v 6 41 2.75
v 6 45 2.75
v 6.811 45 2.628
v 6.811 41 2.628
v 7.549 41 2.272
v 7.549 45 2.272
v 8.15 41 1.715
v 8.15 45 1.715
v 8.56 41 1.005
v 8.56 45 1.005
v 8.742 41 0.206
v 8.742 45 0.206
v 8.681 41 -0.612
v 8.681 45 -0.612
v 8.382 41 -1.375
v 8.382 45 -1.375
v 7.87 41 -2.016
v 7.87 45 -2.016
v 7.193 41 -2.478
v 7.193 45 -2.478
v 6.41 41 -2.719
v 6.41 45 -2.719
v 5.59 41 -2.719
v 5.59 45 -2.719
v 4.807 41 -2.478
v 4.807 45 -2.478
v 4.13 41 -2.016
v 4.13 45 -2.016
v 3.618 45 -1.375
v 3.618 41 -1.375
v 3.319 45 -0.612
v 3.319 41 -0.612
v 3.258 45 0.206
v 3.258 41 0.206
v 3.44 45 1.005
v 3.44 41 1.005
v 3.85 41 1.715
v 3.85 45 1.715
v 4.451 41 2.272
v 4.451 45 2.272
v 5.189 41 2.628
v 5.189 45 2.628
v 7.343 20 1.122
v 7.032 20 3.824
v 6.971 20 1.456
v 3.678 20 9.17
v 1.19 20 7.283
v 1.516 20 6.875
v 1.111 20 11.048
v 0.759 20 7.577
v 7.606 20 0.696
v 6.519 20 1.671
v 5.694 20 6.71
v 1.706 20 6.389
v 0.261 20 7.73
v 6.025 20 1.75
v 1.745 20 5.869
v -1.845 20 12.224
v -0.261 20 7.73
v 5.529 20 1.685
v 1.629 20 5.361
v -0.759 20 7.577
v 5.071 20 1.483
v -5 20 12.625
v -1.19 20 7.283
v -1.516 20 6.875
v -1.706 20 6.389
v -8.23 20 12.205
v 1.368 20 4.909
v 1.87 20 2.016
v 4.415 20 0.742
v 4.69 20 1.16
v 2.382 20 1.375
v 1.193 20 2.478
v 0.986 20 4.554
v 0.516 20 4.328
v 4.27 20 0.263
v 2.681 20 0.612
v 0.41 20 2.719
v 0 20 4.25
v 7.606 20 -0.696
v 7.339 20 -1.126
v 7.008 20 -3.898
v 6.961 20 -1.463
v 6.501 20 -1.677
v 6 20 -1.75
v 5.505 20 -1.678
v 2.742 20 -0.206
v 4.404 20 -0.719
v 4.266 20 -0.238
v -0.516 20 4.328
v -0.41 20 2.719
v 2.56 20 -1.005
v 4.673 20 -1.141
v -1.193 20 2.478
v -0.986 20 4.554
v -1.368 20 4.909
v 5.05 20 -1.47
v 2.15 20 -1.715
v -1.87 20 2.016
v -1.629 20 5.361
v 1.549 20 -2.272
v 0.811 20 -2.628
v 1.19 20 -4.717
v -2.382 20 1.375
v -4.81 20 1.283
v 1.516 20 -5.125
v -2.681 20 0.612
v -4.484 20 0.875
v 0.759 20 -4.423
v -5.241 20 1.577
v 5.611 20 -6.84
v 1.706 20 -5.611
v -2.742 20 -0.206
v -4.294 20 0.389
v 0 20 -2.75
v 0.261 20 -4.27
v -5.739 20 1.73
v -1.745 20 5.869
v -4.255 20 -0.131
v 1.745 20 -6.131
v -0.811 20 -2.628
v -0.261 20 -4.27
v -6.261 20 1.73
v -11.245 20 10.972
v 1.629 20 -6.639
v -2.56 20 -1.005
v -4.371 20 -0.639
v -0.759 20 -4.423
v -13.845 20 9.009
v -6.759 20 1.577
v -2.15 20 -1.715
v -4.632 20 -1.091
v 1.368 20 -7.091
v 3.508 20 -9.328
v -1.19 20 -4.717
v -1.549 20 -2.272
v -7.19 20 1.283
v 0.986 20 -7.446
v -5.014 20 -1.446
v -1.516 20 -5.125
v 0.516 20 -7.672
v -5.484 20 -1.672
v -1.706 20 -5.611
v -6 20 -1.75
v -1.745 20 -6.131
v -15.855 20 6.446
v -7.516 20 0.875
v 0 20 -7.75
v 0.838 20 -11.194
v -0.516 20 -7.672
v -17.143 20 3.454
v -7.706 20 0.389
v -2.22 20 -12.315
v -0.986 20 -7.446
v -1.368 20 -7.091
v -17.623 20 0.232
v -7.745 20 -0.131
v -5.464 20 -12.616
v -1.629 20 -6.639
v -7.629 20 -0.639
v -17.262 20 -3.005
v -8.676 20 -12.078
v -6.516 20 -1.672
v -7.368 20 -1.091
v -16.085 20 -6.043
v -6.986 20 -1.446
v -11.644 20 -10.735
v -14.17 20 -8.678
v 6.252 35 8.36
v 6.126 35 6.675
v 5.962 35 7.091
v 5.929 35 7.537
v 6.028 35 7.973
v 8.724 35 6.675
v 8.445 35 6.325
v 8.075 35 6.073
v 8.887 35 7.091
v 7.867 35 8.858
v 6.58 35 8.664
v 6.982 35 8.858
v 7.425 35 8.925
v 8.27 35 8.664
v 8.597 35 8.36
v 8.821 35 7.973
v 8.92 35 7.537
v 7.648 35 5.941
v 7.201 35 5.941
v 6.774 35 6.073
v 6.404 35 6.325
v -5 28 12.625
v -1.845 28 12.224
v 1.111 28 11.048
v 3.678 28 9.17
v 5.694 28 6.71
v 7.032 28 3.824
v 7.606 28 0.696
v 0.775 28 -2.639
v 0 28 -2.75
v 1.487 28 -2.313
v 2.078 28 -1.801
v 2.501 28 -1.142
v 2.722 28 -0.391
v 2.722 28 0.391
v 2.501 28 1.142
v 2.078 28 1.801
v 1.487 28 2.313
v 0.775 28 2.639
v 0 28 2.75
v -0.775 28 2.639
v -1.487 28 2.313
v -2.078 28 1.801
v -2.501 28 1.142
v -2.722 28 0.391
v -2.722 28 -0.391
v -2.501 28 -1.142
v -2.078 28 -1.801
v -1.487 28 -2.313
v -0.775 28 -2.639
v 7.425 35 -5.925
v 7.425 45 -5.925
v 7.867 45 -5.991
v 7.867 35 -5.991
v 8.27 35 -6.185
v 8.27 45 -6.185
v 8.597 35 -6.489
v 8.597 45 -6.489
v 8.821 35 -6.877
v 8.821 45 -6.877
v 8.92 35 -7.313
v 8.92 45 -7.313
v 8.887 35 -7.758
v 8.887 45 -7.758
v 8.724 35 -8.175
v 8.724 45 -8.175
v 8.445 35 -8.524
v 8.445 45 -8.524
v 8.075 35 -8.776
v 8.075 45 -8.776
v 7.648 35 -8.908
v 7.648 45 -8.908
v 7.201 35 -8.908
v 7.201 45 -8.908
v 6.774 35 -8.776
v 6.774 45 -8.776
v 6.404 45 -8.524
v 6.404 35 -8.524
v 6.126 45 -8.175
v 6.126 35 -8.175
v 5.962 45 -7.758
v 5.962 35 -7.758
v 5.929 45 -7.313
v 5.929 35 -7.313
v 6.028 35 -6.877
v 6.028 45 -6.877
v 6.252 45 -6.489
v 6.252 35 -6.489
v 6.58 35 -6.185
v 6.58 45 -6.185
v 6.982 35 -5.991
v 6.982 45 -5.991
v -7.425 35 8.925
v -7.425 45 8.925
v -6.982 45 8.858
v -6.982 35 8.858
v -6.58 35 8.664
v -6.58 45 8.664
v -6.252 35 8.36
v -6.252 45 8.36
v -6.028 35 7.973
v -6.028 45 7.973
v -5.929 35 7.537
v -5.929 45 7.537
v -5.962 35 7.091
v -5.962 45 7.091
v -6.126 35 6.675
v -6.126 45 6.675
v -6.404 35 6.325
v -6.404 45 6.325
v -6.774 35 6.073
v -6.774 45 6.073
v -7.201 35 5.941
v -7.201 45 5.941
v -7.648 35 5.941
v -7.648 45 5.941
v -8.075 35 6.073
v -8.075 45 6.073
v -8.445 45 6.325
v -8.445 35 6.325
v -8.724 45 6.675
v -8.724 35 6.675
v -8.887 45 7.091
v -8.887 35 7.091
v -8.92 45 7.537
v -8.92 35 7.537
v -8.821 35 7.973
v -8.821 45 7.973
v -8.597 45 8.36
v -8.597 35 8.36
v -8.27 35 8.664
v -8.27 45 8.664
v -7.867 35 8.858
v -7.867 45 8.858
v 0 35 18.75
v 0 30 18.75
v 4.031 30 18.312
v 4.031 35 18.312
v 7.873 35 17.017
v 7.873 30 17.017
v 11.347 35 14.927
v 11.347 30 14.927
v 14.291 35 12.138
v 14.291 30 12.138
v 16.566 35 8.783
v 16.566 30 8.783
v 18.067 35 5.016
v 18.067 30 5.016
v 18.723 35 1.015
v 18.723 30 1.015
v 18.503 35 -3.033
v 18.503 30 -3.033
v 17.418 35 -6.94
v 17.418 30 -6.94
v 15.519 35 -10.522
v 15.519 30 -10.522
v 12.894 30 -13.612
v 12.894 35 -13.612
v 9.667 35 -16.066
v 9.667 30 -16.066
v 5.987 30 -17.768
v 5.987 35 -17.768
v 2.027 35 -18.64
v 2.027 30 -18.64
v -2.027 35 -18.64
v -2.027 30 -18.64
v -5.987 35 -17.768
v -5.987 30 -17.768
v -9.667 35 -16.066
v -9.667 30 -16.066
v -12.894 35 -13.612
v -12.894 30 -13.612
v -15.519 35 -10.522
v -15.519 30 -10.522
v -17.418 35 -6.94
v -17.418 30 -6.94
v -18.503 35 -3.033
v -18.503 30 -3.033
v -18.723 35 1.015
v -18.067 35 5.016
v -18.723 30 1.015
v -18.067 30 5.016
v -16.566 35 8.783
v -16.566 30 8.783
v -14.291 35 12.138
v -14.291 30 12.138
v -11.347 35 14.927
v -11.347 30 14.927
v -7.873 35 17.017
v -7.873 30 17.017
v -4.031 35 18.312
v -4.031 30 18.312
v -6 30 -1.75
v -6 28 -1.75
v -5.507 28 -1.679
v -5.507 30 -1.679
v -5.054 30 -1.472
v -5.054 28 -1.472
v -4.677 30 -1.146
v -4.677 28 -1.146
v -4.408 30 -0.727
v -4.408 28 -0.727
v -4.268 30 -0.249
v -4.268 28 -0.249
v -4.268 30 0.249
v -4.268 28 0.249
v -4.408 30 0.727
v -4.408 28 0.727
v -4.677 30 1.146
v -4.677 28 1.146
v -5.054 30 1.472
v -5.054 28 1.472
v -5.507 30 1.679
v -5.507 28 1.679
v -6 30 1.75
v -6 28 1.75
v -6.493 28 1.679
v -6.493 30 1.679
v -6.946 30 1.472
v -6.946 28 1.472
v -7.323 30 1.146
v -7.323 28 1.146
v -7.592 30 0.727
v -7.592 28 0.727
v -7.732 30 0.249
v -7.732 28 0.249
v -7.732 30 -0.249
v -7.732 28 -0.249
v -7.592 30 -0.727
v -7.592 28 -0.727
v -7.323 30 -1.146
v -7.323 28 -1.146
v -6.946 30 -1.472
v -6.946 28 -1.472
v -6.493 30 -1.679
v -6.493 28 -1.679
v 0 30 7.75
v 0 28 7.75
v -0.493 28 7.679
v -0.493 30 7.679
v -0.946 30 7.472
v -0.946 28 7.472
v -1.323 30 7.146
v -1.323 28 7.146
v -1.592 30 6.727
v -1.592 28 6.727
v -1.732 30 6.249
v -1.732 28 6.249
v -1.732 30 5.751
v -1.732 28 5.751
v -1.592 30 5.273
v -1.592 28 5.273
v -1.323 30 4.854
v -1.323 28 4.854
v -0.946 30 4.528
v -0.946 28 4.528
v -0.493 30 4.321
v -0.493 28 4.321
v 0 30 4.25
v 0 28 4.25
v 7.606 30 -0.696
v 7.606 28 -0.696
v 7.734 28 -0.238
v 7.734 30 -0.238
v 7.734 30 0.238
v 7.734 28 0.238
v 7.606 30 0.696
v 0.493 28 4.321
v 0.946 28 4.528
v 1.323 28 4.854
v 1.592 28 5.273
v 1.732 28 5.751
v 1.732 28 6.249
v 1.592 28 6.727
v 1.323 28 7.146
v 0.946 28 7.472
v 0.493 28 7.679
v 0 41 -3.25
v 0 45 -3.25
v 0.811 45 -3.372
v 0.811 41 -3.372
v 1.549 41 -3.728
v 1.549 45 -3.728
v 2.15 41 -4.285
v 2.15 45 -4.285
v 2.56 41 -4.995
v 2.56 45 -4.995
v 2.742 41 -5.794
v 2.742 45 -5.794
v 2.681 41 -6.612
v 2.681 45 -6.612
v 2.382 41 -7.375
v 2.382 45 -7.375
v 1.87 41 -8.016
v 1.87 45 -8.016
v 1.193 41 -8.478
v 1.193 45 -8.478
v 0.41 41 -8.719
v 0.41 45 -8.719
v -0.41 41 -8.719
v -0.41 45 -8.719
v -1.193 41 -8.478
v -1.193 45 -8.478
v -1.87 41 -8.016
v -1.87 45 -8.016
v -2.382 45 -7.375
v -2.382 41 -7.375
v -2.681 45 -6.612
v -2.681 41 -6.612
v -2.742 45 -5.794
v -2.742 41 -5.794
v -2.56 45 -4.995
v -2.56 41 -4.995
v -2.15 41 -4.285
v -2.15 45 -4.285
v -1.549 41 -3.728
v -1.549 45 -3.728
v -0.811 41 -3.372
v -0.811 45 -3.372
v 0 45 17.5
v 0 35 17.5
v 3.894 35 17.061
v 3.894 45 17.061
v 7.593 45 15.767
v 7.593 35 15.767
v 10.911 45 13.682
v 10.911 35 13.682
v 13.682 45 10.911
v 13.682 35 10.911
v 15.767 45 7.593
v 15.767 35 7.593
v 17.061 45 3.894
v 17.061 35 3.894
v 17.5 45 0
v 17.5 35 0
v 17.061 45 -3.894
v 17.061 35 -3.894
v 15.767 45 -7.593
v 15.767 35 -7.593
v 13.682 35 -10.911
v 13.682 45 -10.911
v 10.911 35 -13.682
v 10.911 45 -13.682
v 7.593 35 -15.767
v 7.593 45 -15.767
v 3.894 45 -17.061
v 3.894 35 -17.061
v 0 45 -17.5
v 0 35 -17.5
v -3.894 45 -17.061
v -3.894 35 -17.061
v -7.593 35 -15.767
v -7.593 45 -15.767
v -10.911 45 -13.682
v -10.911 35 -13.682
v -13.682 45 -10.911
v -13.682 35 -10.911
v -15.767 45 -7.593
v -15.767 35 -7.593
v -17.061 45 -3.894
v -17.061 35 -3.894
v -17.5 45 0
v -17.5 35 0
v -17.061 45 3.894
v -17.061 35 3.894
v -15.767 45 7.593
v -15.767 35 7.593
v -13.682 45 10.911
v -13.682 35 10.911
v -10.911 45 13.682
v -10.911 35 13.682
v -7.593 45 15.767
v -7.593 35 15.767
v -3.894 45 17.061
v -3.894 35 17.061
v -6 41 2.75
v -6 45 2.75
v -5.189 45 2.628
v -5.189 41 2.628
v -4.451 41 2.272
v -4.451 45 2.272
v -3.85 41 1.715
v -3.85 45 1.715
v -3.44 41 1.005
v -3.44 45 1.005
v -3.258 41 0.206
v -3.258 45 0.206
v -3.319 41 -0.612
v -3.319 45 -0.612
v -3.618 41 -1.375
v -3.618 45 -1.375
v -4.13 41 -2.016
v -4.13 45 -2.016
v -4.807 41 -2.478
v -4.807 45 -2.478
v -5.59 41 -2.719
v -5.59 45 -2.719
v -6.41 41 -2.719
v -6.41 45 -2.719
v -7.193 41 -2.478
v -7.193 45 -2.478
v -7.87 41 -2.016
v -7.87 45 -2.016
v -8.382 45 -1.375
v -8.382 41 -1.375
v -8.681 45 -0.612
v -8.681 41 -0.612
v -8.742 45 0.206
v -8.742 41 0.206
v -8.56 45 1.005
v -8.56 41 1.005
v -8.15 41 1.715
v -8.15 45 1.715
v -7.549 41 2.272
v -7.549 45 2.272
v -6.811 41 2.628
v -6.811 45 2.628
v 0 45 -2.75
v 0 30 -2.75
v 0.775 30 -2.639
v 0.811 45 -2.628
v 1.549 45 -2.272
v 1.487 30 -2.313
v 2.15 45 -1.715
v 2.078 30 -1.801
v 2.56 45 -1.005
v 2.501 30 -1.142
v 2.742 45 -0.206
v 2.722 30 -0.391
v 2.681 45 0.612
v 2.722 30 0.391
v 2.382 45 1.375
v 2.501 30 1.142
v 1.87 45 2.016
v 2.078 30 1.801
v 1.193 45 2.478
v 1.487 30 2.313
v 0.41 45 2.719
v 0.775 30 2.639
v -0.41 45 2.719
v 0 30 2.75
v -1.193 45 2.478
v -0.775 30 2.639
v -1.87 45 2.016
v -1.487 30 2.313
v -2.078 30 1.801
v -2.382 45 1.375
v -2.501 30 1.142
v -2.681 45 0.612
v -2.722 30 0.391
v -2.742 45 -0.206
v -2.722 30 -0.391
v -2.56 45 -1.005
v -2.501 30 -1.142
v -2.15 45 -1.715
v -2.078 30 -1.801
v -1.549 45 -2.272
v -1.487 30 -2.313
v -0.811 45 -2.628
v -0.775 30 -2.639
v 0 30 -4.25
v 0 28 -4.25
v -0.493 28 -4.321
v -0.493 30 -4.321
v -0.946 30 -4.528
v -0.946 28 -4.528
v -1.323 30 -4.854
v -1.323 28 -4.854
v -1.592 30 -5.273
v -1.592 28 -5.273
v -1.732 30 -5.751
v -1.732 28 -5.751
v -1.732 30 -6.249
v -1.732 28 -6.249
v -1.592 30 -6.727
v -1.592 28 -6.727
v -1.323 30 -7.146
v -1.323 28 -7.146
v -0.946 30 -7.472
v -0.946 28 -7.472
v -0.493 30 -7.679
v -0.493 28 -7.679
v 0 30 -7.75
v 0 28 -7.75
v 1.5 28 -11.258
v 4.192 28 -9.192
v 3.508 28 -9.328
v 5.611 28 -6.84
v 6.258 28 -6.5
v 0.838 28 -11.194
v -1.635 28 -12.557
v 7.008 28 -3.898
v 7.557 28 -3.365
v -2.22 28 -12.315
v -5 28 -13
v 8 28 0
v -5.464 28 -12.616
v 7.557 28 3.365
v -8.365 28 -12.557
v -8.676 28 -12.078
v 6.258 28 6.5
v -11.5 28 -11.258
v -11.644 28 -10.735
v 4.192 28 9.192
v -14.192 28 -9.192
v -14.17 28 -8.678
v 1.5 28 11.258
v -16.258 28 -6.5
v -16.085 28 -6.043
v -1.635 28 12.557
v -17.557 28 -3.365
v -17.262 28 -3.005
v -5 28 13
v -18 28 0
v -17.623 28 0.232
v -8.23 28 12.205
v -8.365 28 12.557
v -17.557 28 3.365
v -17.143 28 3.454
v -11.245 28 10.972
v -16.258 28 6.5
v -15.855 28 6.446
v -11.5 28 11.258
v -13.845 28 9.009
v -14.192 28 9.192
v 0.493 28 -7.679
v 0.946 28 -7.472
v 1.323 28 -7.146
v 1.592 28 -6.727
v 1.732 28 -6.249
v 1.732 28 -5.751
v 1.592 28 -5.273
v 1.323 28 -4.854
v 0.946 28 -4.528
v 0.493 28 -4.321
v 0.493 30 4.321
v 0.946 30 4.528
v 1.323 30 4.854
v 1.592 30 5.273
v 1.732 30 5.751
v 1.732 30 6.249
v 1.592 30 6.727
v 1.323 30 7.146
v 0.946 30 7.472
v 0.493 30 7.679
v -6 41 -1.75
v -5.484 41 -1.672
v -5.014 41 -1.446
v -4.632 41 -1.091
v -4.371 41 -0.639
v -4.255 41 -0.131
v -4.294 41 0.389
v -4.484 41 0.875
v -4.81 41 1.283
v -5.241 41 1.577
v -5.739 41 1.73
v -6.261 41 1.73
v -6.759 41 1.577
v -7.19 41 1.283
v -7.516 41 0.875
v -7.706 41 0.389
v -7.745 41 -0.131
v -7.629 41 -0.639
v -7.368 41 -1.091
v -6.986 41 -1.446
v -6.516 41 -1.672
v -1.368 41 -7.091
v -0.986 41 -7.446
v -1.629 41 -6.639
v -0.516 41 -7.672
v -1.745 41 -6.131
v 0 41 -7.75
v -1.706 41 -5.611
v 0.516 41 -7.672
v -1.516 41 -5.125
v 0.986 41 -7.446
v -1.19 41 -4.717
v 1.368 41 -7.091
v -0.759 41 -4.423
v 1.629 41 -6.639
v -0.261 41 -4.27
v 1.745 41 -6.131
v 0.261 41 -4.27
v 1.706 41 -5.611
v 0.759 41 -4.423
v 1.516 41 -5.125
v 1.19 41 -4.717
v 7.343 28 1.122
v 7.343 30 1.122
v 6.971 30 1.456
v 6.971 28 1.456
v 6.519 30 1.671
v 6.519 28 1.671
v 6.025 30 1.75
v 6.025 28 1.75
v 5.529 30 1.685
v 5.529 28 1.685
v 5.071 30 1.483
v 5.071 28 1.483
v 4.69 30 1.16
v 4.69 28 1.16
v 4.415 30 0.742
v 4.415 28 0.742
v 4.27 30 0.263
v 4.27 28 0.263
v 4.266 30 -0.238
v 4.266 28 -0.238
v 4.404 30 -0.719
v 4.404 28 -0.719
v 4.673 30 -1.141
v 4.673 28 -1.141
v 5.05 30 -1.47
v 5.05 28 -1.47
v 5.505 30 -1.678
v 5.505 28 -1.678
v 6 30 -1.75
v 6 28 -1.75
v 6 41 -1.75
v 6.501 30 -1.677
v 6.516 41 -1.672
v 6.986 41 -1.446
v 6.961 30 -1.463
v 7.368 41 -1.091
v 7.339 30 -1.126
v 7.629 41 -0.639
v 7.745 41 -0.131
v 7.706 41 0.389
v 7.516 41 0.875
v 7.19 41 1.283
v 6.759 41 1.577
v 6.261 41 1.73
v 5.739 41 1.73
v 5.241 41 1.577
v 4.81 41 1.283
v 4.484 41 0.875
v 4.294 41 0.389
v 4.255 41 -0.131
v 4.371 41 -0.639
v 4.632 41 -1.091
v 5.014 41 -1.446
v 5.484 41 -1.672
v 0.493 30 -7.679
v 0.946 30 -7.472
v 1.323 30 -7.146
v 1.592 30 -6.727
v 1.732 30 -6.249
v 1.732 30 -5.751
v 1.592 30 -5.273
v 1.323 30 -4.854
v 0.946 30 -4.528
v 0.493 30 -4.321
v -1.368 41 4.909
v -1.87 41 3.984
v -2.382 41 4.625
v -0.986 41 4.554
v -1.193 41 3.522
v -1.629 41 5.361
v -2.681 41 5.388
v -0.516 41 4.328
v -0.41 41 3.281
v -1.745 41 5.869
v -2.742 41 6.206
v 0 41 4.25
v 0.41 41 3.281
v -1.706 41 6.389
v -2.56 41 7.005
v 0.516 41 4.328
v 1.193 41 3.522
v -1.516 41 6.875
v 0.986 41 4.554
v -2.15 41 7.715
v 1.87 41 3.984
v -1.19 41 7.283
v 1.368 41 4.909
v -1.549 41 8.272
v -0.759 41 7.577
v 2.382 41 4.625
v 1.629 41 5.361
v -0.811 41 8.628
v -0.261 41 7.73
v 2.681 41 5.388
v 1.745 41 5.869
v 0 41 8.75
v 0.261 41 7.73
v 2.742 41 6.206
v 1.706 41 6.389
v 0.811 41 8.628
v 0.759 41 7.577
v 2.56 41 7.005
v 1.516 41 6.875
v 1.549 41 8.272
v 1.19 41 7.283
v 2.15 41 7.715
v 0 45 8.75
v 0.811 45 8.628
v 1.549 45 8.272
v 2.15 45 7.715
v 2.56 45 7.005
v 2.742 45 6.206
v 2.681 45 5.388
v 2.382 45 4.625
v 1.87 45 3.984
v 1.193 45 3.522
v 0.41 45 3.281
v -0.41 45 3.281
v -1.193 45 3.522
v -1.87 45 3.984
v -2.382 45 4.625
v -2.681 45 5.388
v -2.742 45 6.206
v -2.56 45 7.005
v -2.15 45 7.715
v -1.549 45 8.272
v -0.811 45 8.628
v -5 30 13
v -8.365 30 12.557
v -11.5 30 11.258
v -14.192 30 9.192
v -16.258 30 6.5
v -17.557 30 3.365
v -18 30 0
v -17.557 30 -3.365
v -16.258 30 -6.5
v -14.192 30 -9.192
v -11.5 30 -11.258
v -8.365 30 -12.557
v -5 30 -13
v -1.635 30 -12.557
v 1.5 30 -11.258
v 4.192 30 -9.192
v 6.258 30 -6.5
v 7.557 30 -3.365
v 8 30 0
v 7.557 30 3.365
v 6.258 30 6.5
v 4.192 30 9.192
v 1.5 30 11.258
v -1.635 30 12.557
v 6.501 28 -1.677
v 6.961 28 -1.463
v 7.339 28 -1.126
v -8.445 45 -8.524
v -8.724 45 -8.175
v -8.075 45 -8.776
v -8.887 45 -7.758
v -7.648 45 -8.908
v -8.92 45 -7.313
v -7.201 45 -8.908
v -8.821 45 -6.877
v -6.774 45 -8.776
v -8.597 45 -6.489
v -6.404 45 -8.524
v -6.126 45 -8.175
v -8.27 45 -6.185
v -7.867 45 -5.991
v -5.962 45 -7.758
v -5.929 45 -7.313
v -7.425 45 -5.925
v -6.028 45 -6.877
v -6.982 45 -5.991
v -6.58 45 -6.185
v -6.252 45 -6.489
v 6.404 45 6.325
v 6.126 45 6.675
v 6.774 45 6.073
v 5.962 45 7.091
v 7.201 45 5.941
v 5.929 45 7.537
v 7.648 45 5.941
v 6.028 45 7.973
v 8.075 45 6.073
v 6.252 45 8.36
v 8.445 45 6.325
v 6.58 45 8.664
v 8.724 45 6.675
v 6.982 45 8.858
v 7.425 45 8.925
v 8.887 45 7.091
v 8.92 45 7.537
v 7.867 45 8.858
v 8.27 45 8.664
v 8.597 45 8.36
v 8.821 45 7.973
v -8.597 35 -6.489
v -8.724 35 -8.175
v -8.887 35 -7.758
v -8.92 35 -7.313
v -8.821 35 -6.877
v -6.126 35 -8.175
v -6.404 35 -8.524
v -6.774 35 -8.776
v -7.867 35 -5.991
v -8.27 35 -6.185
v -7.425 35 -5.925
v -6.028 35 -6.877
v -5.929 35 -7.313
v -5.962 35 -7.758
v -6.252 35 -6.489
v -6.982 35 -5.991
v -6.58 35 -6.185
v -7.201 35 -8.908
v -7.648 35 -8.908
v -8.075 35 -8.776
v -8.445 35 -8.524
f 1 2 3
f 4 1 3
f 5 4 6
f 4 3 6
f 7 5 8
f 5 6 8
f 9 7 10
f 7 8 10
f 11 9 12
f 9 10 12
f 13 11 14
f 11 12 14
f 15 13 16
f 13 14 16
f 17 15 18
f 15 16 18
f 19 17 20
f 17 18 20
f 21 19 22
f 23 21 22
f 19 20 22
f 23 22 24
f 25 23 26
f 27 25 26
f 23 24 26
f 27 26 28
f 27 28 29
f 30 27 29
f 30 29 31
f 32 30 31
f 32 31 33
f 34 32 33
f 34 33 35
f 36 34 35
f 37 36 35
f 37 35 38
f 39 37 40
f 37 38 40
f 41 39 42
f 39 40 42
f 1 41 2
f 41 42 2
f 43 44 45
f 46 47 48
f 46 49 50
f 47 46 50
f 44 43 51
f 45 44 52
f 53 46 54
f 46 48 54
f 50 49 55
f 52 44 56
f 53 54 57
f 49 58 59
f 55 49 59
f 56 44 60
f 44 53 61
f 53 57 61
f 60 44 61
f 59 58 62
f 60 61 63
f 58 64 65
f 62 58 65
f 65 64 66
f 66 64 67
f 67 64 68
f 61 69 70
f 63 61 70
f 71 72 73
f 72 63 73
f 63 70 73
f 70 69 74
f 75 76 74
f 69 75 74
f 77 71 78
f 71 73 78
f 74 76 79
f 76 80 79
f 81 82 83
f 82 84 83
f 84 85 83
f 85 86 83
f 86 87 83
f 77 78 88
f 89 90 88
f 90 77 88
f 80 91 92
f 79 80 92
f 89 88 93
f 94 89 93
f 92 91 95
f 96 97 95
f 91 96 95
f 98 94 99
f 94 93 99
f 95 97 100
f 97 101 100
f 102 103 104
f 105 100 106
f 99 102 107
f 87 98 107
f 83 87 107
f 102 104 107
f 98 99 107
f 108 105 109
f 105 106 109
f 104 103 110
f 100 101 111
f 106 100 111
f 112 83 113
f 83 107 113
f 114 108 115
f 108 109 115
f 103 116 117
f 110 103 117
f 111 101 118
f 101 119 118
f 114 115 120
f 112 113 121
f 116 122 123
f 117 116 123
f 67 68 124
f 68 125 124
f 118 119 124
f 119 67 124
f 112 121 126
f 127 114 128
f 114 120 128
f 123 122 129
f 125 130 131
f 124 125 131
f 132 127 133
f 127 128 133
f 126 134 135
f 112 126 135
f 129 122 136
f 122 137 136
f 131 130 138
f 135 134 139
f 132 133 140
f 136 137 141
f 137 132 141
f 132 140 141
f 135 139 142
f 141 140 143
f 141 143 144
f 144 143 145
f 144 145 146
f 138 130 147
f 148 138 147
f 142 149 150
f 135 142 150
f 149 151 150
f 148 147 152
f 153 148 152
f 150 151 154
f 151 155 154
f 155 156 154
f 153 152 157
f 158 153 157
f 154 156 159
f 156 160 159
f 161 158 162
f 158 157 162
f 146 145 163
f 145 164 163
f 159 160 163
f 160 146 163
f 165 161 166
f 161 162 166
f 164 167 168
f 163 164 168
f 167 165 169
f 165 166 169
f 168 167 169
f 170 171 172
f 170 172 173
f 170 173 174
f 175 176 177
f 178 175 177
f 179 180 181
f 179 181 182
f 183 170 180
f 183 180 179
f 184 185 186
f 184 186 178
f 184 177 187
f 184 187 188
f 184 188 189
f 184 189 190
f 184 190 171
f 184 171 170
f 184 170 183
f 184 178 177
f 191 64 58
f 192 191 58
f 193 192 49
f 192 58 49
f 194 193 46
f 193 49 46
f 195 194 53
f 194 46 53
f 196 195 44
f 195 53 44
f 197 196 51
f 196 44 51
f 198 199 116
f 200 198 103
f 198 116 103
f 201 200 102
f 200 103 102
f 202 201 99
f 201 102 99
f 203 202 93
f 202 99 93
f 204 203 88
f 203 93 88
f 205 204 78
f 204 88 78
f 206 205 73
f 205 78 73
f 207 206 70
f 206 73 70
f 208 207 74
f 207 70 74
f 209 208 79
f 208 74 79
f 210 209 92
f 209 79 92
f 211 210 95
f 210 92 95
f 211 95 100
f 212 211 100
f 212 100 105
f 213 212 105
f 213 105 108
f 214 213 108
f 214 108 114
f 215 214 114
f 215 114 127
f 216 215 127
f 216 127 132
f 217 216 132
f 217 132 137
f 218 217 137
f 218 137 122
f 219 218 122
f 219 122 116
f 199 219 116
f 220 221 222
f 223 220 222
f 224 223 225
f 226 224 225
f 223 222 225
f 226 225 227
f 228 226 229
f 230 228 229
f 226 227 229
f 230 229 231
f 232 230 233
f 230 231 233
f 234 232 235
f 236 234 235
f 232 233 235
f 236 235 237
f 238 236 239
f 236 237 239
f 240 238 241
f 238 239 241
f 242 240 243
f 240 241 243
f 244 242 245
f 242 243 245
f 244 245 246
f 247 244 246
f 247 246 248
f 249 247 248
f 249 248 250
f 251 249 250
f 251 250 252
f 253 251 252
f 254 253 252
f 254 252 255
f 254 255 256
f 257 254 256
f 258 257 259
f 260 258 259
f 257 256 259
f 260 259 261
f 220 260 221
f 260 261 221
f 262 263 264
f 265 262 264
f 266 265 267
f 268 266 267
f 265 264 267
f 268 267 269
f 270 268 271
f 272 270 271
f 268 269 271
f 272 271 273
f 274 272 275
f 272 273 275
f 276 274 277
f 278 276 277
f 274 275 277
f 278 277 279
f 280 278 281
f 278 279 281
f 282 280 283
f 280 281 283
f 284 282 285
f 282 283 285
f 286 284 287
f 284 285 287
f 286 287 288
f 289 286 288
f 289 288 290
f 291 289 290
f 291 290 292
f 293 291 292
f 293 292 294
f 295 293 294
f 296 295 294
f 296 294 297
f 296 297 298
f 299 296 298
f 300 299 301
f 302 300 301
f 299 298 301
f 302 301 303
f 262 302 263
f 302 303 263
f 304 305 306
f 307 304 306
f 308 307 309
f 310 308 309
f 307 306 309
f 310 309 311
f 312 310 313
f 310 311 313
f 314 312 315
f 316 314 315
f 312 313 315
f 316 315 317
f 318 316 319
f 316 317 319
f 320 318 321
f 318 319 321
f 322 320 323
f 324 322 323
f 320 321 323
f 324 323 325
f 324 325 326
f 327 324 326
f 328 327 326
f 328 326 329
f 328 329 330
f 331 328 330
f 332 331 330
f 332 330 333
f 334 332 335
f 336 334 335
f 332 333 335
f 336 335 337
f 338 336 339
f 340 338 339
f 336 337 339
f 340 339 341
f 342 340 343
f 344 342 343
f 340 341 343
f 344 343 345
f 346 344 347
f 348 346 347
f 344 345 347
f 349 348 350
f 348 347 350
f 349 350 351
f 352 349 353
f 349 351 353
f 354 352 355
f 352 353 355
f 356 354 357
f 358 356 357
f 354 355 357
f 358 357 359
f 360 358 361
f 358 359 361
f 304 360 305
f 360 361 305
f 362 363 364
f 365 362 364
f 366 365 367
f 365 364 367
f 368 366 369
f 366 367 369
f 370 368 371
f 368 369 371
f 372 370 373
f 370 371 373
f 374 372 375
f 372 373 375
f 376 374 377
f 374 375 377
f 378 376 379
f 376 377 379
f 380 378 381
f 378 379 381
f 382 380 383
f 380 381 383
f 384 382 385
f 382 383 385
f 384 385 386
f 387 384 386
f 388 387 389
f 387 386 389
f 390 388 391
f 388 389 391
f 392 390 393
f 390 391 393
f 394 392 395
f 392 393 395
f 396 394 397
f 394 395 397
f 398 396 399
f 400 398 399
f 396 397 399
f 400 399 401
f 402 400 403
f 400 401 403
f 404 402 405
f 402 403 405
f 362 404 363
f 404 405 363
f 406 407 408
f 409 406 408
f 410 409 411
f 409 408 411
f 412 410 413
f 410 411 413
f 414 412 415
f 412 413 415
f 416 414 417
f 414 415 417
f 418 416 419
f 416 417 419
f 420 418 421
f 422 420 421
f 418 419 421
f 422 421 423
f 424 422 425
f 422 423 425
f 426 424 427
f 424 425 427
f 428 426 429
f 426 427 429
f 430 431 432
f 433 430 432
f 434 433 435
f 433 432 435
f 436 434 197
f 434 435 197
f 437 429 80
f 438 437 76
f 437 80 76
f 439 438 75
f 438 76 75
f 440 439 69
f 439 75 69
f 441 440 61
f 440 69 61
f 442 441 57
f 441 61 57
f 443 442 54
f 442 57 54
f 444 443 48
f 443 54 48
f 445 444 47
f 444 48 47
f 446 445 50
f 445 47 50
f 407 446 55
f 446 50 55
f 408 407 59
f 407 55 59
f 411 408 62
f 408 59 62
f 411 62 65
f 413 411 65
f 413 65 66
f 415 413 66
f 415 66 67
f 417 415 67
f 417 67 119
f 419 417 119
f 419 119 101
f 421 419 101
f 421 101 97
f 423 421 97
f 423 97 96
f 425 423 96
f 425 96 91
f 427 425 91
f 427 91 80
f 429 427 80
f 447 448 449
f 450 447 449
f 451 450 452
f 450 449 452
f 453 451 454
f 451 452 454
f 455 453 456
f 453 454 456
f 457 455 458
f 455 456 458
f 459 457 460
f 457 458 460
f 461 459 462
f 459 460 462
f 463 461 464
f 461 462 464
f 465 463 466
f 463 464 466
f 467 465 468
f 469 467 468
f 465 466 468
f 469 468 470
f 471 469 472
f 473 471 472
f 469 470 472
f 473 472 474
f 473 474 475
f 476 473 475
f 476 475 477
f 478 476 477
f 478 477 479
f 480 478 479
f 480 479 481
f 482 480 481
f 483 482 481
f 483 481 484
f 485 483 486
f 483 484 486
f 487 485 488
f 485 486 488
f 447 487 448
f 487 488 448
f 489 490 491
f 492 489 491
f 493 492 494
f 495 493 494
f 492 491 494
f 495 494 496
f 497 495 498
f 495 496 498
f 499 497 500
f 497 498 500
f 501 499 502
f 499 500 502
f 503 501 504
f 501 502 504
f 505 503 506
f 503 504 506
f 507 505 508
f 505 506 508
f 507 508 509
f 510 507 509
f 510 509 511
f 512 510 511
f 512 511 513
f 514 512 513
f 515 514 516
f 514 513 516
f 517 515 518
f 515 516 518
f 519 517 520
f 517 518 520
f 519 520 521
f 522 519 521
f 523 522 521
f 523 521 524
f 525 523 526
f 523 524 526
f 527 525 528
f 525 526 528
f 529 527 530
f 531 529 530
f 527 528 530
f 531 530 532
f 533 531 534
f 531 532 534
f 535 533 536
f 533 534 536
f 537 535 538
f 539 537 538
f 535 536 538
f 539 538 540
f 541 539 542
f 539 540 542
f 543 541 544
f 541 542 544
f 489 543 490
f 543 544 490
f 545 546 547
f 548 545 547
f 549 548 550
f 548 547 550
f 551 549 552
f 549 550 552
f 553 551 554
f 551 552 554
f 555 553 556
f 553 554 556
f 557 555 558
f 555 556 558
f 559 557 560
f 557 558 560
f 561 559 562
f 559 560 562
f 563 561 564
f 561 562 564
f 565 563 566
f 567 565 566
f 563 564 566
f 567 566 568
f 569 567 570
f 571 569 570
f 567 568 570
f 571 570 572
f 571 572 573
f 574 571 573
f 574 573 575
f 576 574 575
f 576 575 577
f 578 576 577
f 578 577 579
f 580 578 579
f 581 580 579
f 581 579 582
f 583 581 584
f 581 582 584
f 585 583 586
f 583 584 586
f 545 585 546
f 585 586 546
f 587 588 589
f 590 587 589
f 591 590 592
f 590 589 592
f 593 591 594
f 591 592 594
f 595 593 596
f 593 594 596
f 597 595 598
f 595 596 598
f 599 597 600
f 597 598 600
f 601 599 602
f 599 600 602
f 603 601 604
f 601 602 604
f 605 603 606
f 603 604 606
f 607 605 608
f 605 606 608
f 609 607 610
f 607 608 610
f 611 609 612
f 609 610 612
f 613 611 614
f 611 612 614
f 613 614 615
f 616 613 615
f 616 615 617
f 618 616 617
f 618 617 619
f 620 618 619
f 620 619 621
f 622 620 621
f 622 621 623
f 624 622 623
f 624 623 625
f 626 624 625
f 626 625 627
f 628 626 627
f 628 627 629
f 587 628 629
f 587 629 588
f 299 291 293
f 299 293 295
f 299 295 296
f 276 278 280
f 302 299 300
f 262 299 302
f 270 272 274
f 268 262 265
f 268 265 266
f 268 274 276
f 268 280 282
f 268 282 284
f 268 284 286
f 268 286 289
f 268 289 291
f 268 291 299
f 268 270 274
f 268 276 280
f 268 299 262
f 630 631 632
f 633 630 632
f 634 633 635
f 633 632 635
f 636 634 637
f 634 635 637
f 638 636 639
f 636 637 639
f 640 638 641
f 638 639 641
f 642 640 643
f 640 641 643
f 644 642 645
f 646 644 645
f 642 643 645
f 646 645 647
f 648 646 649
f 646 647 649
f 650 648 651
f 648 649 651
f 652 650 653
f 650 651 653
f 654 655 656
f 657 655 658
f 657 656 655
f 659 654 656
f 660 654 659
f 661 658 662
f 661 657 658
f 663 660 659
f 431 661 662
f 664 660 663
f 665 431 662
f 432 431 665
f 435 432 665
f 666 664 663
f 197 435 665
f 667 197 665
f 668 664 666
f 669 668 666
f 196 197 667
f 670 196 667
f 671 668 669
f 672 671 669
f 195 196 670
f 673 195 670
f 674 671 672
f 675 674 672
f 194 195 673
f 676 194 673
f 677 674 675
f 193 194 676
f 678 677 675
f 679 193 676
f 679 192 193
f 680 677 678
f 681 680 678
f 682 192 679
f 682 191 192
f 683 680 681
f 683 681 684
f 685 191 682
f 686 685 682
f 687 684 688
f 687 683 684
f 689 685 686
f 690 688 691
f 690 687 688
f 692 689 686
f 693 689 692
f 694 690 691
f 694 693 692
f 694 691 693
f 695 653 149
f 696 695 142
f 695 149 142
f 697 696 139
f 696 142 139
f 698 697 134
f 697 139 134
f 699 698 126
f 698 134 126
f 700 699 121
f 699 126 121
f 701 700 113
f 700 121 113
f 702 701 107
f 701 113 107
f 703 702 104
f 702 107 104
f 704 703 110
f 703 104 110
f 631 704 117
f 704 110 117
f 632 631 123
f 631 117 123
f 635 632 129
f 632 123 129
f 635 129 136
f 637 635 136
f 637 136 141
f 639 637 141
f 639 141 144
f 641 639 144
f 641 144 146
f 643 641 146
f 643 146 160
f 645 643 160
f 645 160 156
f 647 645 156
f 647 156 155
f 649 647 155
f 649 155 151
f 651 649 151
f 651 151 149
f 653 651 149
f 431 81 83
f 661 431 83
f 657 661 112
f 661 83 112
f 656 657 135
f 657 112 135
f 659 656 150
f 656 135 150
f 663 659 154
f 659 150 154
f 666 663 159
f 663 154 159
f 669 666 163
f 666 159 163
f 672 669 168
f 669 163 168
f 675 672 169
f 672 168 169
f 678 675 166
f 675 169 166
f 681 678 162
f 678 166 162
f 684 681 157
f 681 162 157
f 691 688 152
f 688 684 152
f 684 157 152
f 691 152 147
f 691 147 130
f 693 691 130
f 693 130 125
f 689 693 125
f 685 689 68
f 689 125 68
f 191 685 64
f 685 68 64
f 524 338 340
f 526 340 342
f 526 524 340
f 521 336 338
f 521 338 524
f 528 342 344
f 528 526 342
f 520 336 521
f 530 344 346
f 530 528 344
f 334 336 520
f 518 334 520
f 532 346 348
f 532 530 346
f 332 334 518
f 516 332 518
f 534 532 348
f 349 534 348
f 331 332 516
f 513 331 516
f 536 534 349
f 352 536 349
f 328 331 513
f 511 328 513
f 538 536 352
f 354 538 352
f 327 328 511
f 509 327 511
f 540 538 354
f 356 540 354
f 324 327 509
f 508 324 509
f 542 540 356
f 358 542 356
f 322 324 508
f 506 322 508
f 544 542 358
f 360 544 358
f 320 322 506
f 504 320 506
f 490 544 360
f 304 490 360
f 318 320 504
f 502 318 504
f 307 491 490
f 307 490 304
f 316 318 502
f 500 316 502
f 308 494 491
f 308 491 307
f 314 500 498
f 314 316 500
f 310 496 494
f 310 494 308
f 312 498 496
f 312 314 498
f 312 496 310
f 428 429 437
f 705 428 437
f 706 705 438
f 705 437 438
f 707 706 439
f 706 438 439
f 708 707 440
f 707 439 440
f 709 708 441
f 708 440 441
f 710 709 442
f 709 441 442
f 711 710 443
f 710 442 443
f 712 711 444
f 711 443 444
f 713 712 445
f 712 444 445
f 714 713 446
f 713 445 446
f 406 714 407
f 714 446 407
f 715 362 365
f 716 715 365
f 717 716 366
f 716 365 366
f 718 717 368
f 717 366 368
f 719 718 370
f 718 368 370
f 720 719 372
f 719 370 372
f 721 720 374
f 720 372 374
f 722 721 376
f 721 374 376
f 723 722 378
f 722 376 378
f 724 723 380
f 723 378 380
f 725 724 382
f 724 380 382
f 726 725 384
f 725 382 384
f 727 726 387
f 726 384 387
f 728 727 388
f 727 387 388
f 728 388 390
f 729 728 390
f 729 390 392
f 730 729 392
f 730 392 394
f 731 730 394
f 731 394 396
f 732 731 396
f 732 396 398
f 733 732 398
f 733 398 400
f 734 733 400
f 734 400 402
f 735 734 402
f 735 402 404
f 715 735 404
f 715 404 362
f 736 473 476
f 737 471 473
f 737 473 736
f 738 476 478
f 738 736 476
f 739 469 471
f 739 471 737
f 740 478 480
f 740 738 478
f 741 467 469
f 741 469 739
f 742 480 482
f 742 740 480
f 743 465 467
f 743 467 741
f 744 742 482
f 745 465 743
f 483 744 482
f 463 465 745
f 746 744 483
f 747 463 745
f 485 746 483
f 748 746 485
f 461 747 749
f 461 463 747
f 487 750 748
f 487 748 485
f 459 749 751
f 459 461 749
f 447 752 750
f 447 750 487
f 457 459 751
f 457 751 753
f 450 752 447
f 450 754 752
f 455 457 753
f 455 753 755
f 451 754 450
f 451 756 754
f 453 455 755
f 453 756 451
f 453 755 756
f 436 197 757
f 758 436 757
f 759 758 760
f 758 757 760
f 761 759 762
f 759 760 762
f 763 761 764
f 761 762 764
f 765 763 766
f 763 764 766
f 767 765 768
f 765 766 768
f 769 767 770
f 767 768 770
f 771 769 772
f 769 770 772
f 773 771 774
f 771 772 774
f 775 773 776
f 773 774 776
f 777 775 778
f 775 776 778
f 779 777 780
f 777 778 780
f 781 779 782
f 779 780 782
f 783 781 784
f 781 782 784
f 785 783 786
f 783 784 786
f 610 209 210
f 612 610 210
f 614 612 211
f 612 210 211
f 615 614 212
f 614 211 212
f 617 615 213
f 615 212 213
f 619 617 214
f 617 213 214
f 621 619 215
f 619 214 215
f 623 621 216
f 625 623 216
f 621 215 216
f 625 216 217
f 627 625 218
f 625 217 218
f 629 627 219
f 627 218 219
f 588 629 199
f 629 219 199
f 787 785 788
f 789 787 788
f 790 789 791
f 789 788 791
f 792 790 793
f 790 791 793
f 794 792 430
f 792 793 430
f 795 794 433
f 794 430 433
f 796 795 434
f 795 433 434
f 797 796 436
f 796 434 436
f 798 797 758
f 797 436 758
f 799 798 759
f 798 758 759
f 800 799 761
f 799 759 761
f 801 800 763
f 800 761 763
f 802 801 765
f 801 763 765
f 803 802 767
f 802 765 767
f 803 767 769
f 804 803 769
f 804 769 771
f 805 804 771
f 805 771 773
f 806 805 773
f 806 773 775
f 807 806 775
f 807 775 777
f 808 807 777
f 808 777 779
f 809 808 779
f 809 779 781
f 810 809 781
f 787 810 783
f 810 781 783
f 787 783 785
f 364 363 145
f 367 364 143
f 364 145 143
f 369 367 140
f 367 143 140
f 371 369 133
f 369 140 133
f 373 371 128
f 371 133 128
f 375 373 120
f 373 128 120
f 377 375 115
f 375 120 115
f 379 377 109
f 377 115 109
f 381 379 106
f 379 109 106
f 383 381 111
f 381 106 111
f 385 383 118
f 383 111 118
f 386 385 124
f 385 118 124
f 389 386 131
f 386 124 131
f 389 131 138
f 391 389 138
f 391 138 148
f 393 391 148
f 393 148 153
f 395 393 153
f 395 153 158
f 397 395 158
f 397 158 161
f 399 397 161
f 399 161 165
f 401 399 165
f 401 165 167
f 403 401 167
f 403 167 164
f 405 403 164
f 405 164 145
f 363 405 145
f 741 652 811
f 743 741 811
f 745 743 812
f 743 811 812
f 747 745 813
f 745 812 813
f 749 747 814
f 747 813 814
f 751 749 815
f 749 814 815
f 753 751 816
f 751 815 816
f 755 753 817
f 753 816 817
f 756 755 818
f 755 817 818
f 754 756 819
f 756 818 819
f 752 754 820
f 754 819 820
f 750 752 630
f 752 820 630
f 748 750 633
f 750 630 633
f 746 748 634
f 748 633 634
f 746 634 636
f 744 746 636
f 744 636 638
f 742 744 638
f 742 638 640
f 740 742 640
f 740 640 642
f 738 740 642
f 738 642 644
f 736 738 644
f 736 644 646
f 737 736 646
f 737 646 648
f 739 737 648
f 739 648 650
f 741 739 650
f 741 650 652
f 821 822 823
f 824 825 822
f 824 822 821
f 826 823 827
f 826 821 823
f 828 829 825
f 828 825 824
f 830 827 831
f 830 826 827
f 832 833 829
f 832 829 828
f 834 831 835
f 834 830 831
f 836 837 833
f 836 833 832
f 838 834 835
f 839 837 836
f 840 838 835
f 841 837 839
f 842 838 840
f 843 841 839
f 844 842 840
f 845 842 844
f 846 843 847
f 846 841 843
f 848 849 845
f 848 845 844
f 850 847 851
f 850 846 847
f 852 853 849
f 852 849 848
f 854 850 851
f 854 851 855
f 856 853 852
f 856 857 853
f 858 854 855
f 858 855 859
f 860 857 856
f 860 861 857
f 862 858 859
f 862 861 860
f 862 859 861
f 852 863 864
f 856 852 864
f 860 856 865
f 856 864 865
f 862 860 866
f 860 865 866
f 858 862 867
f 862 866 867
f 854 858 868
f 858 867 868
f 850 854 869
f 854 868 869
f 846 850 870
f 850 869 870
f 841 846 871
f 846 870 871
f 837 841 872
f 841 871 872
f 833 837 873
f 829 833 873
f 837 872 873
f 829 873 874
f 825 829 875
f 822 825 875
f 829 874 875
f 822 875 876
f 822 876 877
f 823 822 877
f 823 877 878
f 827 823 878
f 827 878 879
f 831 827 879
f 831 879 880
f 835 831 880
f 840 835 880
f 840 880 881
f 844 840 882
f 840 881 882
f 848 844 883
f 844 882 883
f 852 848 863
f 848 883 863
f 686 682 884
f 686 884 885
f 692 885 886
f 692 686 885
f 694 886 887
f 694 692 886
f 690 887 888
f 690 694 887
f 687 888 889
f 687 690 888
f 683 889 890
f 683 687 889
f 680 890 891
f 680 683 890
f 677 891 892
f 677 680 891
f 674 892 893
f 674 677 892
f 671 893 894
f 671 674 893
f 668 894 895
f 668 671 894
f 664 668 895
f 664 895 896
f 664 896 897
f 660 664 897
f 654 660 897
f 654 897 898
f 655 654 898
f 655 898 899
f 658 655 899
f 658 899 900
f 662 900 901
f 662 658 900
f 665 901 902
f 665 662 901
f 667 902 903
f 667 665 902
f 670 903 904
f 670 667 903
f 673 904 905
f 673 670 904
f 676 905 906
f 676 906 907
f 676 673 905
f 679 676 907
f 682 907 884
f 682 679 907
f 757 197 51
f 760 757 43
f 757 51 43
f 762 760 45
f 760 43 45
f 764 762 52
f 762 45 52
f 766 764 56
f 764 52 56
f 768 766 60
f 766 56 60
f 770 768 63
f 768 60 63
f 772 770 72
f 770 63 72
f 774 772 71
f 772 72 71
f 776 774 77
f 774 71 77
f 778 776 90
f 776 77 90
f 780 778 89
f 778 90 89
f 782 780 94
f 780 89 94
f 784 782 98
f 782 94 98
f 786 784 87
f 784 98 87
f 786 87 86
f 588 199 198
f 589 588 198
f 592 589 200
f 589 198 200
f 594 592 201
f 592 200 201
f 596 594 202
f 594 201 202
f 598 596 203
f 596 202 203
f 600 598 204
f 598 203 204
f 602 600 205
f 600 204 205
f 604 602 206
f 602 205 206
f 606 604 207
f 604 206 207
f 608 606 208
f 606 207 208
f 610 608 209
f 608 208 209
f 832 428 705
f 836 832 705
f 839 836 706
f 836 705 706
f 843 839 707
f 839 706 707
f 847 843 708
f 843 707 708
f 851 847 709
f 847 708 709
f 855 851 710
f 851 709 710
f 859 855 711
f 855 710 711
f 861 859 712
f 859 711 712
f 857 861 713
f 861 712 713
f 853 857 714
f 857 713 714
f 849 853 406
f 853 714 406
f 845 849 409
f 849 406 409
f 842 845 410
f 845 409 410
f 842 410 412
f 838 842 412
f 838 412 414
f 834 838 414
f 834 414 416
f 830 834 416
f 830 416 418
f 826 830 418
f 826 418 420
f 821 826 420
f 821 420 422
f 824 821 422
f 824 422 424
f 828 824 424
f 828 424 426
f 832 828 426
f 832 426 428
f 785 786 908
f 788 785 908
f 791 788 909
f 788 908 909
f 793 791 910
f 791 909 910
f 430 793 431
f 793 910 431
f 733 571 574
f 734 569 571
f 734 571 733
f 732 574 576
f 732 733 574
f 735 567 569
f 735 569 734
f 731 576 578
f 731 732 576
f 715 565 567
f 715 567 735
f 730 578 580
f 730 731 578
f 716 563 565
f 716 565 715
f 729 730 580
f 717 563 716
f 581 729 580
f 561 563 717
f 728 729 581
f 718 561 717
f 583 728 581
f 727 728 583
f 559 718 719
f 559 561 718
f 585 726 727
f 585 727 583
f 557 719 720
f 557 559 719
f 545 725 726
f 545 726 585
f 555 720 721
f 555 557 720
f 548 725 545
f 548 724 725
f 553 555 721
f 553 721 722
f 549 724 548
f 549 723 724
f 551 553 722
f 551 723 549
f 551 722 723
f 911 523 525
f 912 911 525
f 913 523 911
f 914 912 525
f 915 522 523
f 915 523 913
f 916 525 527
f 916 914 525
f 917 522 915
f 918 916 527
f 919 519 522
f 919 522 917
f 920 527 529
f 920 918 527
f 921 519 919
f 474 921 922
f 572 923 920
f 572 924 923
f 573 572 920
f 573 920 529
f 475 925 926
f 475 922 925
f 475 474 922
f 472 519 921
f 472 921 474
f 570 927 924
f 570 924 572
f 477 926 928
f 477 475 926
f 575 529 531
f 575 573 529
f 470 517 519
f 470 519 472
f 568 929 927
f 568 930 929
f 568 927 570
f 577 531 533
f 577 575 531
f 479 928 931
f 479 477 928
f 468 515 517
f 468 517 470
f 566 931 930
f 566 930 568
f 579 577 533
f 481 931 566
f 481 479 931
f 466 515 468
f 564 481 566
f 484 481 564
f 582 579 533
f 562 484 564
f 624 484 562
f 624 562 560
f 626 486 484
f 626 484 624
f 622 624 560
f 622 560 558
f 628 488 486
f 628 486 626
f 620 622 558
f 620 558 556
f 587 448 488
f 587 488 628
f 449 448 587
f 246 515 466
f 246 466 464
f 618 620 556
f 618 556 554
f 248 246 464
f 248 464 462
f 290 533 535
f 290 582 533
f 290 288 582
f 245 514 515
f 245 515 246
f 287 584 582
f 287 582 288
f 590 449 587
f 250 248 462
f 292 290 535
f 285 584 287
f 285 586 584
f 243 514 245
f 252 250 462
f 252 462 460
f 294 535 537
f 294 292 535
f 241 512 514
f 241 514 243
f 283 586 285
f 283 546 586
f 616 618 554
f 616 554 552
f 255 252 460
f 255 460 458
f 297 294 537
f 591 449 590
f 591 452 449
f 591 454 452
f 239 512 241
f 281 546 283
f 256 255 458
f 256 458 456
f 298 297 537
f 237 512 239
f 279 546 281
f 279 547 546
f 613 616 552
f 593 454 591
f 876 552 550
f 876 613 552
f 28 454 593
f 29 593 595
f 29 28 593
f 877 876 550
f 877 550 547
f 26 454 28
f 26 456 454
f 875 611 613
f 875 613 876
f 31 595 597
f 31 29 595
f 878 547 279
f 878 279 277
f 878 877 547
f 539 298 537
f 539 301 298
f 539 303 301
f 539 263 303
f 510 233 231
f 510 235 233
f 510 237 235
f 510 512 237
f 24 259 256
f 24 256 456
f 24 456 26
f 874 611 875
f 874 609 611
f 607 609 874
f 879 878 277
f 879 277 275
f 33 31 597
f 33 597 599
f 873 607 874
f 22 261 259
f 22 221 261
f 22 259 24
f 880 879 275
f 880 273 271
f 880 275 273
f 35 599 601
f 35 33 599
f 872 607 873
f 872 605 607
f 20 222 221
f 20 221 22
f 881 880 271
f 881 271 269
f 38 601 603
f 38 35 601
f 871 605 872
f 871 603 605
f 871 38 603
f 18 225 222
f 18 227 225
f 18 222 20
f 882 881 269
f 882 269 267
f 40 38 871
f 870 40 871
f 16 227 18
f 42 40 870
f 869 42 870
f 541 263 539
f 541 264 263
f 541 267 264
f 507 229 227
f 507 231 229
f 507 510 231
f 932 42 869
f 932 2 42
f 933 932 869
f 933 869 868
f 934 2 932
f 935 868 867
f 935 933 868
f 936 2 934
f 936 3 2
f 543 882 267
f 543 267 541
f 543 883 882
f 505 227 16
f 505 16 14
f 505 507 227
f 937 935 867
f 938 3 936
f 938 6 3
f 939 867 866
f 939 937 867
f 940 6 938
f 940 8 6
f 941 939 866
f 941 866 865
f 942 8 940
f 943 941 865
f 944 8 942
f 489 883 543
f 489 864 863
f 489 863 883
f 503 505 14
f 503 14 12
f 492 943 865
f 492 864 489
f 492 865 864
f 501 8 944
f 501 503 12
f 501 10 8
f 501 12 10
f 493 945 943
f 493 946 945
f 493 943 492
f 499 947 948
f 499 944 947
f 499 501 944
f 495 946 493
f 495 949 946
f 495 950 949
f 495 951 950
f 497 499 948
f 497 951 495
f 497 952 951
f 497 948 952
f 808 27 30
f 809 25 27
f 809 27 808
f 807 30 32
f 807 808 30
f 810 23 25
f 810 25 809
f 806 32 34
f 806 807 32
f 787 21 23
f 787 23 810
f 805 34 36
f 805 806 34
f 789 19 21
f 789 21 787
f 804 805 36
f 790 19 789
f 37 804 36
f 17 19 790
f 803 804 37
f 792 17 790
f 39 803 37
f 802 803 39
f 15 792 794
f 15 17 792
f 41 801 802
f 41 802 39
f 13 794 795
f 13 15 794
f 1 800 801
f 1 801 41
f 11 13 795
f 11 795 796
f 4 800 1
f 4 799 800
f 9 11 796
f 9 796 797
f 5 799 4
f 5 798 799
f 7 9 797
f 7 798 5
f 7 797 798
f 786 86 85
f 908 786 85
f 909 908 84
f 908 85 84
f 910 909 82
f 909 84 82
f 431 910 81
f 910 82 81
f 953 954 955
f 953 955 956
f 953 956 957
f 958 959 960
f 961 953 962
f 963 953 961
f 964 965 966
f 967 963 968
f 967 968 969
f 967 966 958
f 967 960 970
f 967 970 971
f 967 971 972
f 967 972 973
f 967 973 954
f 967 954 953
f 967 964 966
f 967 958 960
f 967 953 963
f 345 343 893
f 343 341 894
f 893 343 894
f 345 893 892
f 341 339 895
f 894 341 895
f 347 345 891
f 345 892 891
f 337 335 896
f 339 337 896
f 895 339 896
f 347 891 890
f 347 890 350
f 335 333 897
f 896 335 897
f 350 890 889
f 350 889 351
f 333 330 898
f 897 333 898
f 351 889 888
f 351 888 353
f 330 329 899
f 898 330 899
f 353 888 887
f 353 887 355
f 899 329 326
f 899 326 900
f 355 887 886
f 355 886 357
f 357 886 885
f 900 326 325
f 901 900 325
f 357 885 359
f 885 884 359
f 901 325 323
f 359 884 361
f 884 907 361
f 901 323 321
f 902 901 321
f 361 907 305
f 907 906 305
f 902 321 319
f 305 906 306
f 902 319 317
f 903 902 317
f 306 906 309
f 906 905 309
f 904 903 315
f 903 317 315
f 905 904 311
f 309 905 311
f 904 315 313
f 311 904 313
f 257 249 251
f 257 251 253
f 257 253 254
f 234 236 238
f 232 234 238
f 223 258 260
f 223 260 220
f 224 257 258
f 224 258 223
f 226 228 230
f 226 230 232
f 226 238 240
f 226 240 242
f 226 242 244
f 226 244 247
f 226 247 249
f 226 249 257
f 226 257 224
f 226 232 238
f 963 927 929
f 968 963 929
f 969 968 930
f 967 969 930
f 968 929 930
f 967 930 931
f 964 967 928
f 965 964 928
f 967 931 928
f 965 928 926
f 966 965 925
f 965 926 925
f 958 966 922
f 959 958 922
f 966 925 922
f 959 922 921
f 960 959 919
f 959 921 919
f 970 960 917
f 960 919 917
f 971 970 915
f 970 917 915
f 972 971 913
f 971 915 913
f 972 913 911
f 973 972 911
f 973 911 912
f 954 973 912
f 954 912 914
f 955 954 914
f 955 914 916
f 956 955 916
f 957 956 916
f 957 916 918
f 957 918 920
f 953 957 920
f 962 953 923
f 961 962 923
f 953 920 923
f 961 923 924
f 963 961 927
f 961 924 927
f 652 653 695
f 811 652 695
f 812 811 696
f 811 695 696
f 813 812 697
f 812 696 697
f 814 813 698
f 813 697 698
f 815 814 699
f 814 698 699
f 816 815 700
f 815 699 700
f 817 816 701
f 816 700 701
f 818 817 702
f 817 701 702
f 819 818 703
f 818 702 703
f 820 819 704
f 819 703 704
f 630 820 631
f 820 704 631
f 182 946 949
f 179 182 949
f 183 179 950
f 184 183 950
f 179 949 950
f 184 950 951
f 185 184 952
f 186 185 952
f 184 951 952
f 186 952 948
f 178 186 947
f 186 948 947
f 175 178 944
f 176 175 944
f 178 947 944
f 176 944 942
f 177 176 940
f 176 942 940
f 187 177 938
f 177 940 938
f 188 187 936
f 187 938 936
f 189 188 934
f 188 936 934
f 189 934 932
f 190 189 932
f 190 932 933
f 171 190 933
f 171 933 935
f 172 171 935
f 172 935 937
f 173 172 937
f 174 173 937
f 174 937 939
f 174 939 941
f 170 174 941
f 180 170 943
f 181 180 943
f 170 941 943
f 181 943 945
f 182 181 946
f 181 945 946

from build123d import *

# Parameters (mm, degrees)
SKETCH1_R                = 15
BOSS_EXTRUDE1_DEPTH      = 5
SKETCH2_R                = 12.6
BOSS_EXTRUDE2_DEPTH      = 10
SKETCH3_R                = 7.5
BOSS_EXTRUDE3_DEPTH      = 5
SKETCH4_R                = 12.625
BOSS_EXTRUDE4_DEPTH      = 10
SKETCH8_R                = 18.75
BOSS_EXTRUDE5_DEPTH      = 5
SKETCH10_R               = 17.5
BOSS_EXTRUDE7_DEPTH      = 10
SKETCH11_R               = 17.65
BOSS_EXTRUDE8_DEPTH      = 10
CUT_EXTRUDE1_REACH       = 63.058
SKETCH12_R               = 1.75
SKETCH12_R_2             = 2.75
CUT_EXTRUDE12_DEPTH      = 53.231456039
CUT_EXTRUDE12_DEPTH_BACK = 53.231456039
SKETCH27_W               = 40.004352786
SKETCH27_H               = 30
BOSS_EXTRUDE11_START     = 2
SKETCH30_R               = 13
SKETCH30_R_2             = 1.75
SKETCH30_R_3             = 2.75
BOSS_EXTRUDE11_DEPTH     = 2
SKETCH31_R               = 1.5
CUT_EXTRUDE13_DEPTH      = 10
SKETCH32_R               = 2.75
CUT_EXTRUDE14_DEPTH      = 4


with BuildPart() as part:
    # Sketch1 → Boss-Extrude1 (new body)
    with BuildSketch(Plane(origin=(0, 0, 0), x_dir=(1, 0, 0), z_dir=(0, 1, 0))):
        with Locations(Location((0, 0, 0), (0, 0, 270))):
            Circle(SKETCH1_R)
    extrude(amount=BOSS_EXTRUDE1_DEPTH)

    # Sketch2 → Boss-Extrude2 (add)
    with BuildSketch(Plane(origin=(0, 5, 0), x_dir=(1, 0, 0), z_dir=(0, 1, 0))):
        with Locations(Location((5, 0, 0), (0, 0, 70.894925587))):
            Circle(SKETCH2_R)
    extrude(amount=BOSS_EXTRUDE2_DEPTH)

    # Sketch3 → Boss-Extrude3 (add)
    with BuildSketch(Plane(origin=(0, 15, 0), x_dir=(1, 0, 0), z_dir=(0, 1, 0))):
        with Locations(Location((0, 0, 0), (0, 0, 270))):
            Circle(SKETCH3_R)
    extrude(amount=BOSS_EXTRUDE3_DEPTH)

    # Sketch4 → Boss-Extrude4 (add)
    with BuildSketch(Plane(origin=(0, 20, 0), x_dir=(1, 0, 0), z_dir=(0, 1, 0))):
        with Locations(Location((-5, 0, 0), (0, 0, 270))):
            Circle(SKETCH4_R)
    extrude(amount=BOSS_EXTRUDE4_DEPTH)

    # Sketch8 → Boss-Extrude5 (add)
    with BuildSketch(Plane(origin=(0, 30, 0), x_dir=(1, 0, 0), z_dir=(0, 1, 0))):
        with Locations(Location((0, 0, 0), (0, 0, 270))):
            Circle(SKETCH8_R)
    extrude(amount=BOSS_EXTRUDE5_DEPTH)

    # Sketch10 → Boss-Extrude7 (add)
    with BuildSketch(Plane(origin=(0, 35, 0), x_dir=(1, 0, 0), z_dir=(0, 1, 0))):
        with Locations(Location((0, 0, 0), (0, 0, 270))):
            Circle(SKETCH10_R)
    extrude(amount=BOSS_EXTRUDE7_DEPTH)

    # Sketch11 → Boss-Extrude8 (add)
    with BuildSketch(Plane.XZ):
        with Locations(Location((0, 0, 0), (0, 0, 270))):
            Circle(SKETCH11_R)
    extrude(amount=BOSS_EXTRUDE8_DEPTH)

    # Cut-Extrude1: up to this face of the body (flat: up to its plane)
    cut_extrude1_end = Plane(part.part.faces().sort_by_distance((0, 45, 0))[0])
    # Sketch12 → Cut-Extrude1 (cut, up to the picked face)
    with BuildSketch(Plane.XZ.offset(10), mode=Mode.PRIVATE) as cut_extrude1_sk1:
        with Locations(Location((0, 6, 0), (0, 0, 270))):
            Circle(SKETCH12_R)
    cut_extrude1_tool1 = split(extrude(cut_extrude1_sk1.sketch, amount=-CUT_EXTRUDE1_REACH, mode=Mode.PRIVATE), bisect_by=cut_extrude1_end, keep=Keep.BOTH, mode=Mode.PRIVATE)
    # Sketch12 → Cut-Extrude1 (cut, up to the picked face)
    with BuildSketch(Plane.XZ.offset(10), mode=Mode.PRIVATE) as cut_extrude1_sk2:
        with Locations(Location((0, -6, 0), (0, 0, 270))):
            Circle(SKETCH12_R)
    cut_extrude1_tool2 = split(extrude(cut_extrude1_sk2.sketch, amount=-CUT_EXTRUDE1_REACH, mode=Mode.PRIVATE), bisect_by=cut_extrude1_end, keep=Keep.BOTH, mode=Mode.PRIVATE)
    # Sketch12 → Cut-Extrude1 (cut, up to the picked face)
    with BuildSketch(Plane.XZ.offset(10), mode=Mode.PRIVATE) as cut_extrude1_sk3:
        with Locations(Location((6, 0, 0), (0, 0, 270))):
            Circle(SKETCH12_R)
    cut_extrude1_tool3 = split(extrude(cut_extrude1_sk3.sketch, amount=-CUT_EXTRUDE1_REACH, mode=Mode.PRIVATE), bisect_by=cut_extrude1_end, keep=Keep.BOTH, mode=Mode.PRIVATE)
    # Sketch12 → Cut-Extrude1 (cut, up to the picked face)
    with BuildSketch(Plane.XZ.offset(10), mode=Mode.PRIVATE) as cut_extrude1_sk4:
        with Locations(Location((-6, 0, 0), (0, 0, 270))):
            Circle(SKETCH12_R)
    cut_extrude1_tool4 = split(extrude(cut_extrude1_sk4.sketch, amount=-CUT_EXTRUDE1_REACH, mode=Mode.PRIVATE), bisect_by=cut_extrude1_end, keep=Keep.BOTH, mode=Mode.PRIVATE)
    # Sketch12 → Cut-Extrude1 (cut, up to the picked face)
    with BuildSketch(Plane.XZ.offset(10), mode=Mode.PRIVATE) as cut_extrude1_sk5:
        with Locations(Location((0, 0, 0), (0, 0, 270))):
            Circle(SKETCH12_R_2)
    cut_extrude1_tool5 = split(extrude(cut_extrude1_sk5.sketch, amount=-CUT_EXTRUDE1_REACH, mode=Mode.PRIVATE), bisect_by=cut_extrude1_end, keep=Keep.BOTH, mode=Mode.PRIVATE)
    add(cut_extrude1_tool1.solids().sort_by(Axis((0, -10, 6), (0, 1, 0)))[0], mode=Mode.SUBTRACT)
    add(cut_extrude1_tool2.solids().sort_by(Axis((0, -10, -6), (0, 1, 0)))[0], mode=Mode.SUBTRACT)
    add(cut_extrude1_tool3.solids().sort_by(Axis((6, -10, 0), (0, 1, 0)))[0], mode=Mode.SUBTRACT)
    add(cut_extrude1_tool4.solids().sort_by(Axis((-6, -10, 0), (0, 1, 0)))[0], mode=Mode.SUBTRACT)
    add(cut_extrude1_tool5.solids().sort_by(Axis((0, -10, 0), (0, 1, 0)))[0], mode=Mode.SUBTRACT)

    # Sketch27 → Cut-Extrude12 (cut, two sides: drawn at the far end of the back side and taken through both)
    with BuildSketch(Plane(origin=(0, 0, 0), x_dir=(0, 0, -1), z_dir=(1, 0, 0)).offset(-CUT_EXTRUDE12_DEPTH_BACK)):
        with Locations((-0.026275673, 5)):
            Rectangle(SKETCH27_W, SKETCH27_H)
    extrude(amount=CUT_EXTRUDE12_DEPTH + CUT_EXTRUDE12_DEPTH_BACK, mode=Mode.SUBTRACT)

    # Sketch30 → Boss-Extrude11 (add)
    with BuildSketch(Plane.XZ.offset(-30).offset(BOSS_EXTRUDE11_START)):
        with Locations(Location((-5, 0, 0), (0, 0, 90))):
            Circle(SKETCH30_R)
        with Locations(Location((0, -6, 0), (0, 0, 90))):
            Circle(SKETCH30_R_2, mode=Mode.SUBTRACT)
        with Locations(Location((-6, 0, 0), (0, 0, 90))):
            Circle(SKETCH30_R_2, mode=Mode.SUBTRACT)
        with Locations(Location((0, 6, 0), (0, 0, 90))):
            Circle(SKETCH30_R_2, mode=Mode.SUBTRACT)
        with Locations(Location((6, 0, 0), (0, 0, 336.579668072))):
            Circle(SKETCH30_R_2, mode=Mode.SUBTRACT)
        with Locations(Location((0, 0, 0), (0, 0, 90))):
            Circle(SKETCH30_R_3, mode=Mode.SUBTRACT)
    extrude(amount=-BOSS_EXTRUDE11_DEPTH)

    # Sketch31 → Cut-Extrude13 (cut)
    with BuildSketch(Plane(origin=(0, 45, 0), x_dir=(1, 0, 0), z_dir=(0, 1, 0))):
        with Locations(Location((-7.424621202, 7.424621202, 0), (0, 0, 270))):
            Circle(SKETCH31_R)
        with Locations(Location((7.424621202, 7.424621202, 0), (0, 0, 270))):
            Circle(SKETCH31_R)
        with Locations(Location((7.424621202, -7.424621202, 0), (0, 0, 270))):
            Circle(SKETCH31_R)
        with Locations(Location((-7.424621202, -7.424621202, 0), (0, 0, 270))):
            Circle(SKETCH31_R)
    extrude(amount=-CUT_EXTRUDE13_DEPTH, mode=Mode.SUBTRACT)

    # Sketch32 → Cut-Extrude14 (cut)
    with BuildSketch(Plane(origin=(0, 45, 0), x_dir=(1, 0, 0), z_dir=(0, 1, 0))):
        with Locations(Location((-6, 0, 0), (0, 0, 270))):
            Circle(SKETCH32_R)
        with Locations(Location((0, 6, 0), (0, 0, 270))):
            Circle(SKETCH32_R)
        with Locations(Location((6, 0, 0), (0, 0, 270))):
            Circle(SKETCH32_R)
        with Locations(Location((0, -6, 0), (0, 0, 270))):
            Circle(SKETCH32_R)
    extrude(amount=-CUT_EXTRUDE14_DEPTH, mode=Mode.SUBTRACT)


solid = part.part
